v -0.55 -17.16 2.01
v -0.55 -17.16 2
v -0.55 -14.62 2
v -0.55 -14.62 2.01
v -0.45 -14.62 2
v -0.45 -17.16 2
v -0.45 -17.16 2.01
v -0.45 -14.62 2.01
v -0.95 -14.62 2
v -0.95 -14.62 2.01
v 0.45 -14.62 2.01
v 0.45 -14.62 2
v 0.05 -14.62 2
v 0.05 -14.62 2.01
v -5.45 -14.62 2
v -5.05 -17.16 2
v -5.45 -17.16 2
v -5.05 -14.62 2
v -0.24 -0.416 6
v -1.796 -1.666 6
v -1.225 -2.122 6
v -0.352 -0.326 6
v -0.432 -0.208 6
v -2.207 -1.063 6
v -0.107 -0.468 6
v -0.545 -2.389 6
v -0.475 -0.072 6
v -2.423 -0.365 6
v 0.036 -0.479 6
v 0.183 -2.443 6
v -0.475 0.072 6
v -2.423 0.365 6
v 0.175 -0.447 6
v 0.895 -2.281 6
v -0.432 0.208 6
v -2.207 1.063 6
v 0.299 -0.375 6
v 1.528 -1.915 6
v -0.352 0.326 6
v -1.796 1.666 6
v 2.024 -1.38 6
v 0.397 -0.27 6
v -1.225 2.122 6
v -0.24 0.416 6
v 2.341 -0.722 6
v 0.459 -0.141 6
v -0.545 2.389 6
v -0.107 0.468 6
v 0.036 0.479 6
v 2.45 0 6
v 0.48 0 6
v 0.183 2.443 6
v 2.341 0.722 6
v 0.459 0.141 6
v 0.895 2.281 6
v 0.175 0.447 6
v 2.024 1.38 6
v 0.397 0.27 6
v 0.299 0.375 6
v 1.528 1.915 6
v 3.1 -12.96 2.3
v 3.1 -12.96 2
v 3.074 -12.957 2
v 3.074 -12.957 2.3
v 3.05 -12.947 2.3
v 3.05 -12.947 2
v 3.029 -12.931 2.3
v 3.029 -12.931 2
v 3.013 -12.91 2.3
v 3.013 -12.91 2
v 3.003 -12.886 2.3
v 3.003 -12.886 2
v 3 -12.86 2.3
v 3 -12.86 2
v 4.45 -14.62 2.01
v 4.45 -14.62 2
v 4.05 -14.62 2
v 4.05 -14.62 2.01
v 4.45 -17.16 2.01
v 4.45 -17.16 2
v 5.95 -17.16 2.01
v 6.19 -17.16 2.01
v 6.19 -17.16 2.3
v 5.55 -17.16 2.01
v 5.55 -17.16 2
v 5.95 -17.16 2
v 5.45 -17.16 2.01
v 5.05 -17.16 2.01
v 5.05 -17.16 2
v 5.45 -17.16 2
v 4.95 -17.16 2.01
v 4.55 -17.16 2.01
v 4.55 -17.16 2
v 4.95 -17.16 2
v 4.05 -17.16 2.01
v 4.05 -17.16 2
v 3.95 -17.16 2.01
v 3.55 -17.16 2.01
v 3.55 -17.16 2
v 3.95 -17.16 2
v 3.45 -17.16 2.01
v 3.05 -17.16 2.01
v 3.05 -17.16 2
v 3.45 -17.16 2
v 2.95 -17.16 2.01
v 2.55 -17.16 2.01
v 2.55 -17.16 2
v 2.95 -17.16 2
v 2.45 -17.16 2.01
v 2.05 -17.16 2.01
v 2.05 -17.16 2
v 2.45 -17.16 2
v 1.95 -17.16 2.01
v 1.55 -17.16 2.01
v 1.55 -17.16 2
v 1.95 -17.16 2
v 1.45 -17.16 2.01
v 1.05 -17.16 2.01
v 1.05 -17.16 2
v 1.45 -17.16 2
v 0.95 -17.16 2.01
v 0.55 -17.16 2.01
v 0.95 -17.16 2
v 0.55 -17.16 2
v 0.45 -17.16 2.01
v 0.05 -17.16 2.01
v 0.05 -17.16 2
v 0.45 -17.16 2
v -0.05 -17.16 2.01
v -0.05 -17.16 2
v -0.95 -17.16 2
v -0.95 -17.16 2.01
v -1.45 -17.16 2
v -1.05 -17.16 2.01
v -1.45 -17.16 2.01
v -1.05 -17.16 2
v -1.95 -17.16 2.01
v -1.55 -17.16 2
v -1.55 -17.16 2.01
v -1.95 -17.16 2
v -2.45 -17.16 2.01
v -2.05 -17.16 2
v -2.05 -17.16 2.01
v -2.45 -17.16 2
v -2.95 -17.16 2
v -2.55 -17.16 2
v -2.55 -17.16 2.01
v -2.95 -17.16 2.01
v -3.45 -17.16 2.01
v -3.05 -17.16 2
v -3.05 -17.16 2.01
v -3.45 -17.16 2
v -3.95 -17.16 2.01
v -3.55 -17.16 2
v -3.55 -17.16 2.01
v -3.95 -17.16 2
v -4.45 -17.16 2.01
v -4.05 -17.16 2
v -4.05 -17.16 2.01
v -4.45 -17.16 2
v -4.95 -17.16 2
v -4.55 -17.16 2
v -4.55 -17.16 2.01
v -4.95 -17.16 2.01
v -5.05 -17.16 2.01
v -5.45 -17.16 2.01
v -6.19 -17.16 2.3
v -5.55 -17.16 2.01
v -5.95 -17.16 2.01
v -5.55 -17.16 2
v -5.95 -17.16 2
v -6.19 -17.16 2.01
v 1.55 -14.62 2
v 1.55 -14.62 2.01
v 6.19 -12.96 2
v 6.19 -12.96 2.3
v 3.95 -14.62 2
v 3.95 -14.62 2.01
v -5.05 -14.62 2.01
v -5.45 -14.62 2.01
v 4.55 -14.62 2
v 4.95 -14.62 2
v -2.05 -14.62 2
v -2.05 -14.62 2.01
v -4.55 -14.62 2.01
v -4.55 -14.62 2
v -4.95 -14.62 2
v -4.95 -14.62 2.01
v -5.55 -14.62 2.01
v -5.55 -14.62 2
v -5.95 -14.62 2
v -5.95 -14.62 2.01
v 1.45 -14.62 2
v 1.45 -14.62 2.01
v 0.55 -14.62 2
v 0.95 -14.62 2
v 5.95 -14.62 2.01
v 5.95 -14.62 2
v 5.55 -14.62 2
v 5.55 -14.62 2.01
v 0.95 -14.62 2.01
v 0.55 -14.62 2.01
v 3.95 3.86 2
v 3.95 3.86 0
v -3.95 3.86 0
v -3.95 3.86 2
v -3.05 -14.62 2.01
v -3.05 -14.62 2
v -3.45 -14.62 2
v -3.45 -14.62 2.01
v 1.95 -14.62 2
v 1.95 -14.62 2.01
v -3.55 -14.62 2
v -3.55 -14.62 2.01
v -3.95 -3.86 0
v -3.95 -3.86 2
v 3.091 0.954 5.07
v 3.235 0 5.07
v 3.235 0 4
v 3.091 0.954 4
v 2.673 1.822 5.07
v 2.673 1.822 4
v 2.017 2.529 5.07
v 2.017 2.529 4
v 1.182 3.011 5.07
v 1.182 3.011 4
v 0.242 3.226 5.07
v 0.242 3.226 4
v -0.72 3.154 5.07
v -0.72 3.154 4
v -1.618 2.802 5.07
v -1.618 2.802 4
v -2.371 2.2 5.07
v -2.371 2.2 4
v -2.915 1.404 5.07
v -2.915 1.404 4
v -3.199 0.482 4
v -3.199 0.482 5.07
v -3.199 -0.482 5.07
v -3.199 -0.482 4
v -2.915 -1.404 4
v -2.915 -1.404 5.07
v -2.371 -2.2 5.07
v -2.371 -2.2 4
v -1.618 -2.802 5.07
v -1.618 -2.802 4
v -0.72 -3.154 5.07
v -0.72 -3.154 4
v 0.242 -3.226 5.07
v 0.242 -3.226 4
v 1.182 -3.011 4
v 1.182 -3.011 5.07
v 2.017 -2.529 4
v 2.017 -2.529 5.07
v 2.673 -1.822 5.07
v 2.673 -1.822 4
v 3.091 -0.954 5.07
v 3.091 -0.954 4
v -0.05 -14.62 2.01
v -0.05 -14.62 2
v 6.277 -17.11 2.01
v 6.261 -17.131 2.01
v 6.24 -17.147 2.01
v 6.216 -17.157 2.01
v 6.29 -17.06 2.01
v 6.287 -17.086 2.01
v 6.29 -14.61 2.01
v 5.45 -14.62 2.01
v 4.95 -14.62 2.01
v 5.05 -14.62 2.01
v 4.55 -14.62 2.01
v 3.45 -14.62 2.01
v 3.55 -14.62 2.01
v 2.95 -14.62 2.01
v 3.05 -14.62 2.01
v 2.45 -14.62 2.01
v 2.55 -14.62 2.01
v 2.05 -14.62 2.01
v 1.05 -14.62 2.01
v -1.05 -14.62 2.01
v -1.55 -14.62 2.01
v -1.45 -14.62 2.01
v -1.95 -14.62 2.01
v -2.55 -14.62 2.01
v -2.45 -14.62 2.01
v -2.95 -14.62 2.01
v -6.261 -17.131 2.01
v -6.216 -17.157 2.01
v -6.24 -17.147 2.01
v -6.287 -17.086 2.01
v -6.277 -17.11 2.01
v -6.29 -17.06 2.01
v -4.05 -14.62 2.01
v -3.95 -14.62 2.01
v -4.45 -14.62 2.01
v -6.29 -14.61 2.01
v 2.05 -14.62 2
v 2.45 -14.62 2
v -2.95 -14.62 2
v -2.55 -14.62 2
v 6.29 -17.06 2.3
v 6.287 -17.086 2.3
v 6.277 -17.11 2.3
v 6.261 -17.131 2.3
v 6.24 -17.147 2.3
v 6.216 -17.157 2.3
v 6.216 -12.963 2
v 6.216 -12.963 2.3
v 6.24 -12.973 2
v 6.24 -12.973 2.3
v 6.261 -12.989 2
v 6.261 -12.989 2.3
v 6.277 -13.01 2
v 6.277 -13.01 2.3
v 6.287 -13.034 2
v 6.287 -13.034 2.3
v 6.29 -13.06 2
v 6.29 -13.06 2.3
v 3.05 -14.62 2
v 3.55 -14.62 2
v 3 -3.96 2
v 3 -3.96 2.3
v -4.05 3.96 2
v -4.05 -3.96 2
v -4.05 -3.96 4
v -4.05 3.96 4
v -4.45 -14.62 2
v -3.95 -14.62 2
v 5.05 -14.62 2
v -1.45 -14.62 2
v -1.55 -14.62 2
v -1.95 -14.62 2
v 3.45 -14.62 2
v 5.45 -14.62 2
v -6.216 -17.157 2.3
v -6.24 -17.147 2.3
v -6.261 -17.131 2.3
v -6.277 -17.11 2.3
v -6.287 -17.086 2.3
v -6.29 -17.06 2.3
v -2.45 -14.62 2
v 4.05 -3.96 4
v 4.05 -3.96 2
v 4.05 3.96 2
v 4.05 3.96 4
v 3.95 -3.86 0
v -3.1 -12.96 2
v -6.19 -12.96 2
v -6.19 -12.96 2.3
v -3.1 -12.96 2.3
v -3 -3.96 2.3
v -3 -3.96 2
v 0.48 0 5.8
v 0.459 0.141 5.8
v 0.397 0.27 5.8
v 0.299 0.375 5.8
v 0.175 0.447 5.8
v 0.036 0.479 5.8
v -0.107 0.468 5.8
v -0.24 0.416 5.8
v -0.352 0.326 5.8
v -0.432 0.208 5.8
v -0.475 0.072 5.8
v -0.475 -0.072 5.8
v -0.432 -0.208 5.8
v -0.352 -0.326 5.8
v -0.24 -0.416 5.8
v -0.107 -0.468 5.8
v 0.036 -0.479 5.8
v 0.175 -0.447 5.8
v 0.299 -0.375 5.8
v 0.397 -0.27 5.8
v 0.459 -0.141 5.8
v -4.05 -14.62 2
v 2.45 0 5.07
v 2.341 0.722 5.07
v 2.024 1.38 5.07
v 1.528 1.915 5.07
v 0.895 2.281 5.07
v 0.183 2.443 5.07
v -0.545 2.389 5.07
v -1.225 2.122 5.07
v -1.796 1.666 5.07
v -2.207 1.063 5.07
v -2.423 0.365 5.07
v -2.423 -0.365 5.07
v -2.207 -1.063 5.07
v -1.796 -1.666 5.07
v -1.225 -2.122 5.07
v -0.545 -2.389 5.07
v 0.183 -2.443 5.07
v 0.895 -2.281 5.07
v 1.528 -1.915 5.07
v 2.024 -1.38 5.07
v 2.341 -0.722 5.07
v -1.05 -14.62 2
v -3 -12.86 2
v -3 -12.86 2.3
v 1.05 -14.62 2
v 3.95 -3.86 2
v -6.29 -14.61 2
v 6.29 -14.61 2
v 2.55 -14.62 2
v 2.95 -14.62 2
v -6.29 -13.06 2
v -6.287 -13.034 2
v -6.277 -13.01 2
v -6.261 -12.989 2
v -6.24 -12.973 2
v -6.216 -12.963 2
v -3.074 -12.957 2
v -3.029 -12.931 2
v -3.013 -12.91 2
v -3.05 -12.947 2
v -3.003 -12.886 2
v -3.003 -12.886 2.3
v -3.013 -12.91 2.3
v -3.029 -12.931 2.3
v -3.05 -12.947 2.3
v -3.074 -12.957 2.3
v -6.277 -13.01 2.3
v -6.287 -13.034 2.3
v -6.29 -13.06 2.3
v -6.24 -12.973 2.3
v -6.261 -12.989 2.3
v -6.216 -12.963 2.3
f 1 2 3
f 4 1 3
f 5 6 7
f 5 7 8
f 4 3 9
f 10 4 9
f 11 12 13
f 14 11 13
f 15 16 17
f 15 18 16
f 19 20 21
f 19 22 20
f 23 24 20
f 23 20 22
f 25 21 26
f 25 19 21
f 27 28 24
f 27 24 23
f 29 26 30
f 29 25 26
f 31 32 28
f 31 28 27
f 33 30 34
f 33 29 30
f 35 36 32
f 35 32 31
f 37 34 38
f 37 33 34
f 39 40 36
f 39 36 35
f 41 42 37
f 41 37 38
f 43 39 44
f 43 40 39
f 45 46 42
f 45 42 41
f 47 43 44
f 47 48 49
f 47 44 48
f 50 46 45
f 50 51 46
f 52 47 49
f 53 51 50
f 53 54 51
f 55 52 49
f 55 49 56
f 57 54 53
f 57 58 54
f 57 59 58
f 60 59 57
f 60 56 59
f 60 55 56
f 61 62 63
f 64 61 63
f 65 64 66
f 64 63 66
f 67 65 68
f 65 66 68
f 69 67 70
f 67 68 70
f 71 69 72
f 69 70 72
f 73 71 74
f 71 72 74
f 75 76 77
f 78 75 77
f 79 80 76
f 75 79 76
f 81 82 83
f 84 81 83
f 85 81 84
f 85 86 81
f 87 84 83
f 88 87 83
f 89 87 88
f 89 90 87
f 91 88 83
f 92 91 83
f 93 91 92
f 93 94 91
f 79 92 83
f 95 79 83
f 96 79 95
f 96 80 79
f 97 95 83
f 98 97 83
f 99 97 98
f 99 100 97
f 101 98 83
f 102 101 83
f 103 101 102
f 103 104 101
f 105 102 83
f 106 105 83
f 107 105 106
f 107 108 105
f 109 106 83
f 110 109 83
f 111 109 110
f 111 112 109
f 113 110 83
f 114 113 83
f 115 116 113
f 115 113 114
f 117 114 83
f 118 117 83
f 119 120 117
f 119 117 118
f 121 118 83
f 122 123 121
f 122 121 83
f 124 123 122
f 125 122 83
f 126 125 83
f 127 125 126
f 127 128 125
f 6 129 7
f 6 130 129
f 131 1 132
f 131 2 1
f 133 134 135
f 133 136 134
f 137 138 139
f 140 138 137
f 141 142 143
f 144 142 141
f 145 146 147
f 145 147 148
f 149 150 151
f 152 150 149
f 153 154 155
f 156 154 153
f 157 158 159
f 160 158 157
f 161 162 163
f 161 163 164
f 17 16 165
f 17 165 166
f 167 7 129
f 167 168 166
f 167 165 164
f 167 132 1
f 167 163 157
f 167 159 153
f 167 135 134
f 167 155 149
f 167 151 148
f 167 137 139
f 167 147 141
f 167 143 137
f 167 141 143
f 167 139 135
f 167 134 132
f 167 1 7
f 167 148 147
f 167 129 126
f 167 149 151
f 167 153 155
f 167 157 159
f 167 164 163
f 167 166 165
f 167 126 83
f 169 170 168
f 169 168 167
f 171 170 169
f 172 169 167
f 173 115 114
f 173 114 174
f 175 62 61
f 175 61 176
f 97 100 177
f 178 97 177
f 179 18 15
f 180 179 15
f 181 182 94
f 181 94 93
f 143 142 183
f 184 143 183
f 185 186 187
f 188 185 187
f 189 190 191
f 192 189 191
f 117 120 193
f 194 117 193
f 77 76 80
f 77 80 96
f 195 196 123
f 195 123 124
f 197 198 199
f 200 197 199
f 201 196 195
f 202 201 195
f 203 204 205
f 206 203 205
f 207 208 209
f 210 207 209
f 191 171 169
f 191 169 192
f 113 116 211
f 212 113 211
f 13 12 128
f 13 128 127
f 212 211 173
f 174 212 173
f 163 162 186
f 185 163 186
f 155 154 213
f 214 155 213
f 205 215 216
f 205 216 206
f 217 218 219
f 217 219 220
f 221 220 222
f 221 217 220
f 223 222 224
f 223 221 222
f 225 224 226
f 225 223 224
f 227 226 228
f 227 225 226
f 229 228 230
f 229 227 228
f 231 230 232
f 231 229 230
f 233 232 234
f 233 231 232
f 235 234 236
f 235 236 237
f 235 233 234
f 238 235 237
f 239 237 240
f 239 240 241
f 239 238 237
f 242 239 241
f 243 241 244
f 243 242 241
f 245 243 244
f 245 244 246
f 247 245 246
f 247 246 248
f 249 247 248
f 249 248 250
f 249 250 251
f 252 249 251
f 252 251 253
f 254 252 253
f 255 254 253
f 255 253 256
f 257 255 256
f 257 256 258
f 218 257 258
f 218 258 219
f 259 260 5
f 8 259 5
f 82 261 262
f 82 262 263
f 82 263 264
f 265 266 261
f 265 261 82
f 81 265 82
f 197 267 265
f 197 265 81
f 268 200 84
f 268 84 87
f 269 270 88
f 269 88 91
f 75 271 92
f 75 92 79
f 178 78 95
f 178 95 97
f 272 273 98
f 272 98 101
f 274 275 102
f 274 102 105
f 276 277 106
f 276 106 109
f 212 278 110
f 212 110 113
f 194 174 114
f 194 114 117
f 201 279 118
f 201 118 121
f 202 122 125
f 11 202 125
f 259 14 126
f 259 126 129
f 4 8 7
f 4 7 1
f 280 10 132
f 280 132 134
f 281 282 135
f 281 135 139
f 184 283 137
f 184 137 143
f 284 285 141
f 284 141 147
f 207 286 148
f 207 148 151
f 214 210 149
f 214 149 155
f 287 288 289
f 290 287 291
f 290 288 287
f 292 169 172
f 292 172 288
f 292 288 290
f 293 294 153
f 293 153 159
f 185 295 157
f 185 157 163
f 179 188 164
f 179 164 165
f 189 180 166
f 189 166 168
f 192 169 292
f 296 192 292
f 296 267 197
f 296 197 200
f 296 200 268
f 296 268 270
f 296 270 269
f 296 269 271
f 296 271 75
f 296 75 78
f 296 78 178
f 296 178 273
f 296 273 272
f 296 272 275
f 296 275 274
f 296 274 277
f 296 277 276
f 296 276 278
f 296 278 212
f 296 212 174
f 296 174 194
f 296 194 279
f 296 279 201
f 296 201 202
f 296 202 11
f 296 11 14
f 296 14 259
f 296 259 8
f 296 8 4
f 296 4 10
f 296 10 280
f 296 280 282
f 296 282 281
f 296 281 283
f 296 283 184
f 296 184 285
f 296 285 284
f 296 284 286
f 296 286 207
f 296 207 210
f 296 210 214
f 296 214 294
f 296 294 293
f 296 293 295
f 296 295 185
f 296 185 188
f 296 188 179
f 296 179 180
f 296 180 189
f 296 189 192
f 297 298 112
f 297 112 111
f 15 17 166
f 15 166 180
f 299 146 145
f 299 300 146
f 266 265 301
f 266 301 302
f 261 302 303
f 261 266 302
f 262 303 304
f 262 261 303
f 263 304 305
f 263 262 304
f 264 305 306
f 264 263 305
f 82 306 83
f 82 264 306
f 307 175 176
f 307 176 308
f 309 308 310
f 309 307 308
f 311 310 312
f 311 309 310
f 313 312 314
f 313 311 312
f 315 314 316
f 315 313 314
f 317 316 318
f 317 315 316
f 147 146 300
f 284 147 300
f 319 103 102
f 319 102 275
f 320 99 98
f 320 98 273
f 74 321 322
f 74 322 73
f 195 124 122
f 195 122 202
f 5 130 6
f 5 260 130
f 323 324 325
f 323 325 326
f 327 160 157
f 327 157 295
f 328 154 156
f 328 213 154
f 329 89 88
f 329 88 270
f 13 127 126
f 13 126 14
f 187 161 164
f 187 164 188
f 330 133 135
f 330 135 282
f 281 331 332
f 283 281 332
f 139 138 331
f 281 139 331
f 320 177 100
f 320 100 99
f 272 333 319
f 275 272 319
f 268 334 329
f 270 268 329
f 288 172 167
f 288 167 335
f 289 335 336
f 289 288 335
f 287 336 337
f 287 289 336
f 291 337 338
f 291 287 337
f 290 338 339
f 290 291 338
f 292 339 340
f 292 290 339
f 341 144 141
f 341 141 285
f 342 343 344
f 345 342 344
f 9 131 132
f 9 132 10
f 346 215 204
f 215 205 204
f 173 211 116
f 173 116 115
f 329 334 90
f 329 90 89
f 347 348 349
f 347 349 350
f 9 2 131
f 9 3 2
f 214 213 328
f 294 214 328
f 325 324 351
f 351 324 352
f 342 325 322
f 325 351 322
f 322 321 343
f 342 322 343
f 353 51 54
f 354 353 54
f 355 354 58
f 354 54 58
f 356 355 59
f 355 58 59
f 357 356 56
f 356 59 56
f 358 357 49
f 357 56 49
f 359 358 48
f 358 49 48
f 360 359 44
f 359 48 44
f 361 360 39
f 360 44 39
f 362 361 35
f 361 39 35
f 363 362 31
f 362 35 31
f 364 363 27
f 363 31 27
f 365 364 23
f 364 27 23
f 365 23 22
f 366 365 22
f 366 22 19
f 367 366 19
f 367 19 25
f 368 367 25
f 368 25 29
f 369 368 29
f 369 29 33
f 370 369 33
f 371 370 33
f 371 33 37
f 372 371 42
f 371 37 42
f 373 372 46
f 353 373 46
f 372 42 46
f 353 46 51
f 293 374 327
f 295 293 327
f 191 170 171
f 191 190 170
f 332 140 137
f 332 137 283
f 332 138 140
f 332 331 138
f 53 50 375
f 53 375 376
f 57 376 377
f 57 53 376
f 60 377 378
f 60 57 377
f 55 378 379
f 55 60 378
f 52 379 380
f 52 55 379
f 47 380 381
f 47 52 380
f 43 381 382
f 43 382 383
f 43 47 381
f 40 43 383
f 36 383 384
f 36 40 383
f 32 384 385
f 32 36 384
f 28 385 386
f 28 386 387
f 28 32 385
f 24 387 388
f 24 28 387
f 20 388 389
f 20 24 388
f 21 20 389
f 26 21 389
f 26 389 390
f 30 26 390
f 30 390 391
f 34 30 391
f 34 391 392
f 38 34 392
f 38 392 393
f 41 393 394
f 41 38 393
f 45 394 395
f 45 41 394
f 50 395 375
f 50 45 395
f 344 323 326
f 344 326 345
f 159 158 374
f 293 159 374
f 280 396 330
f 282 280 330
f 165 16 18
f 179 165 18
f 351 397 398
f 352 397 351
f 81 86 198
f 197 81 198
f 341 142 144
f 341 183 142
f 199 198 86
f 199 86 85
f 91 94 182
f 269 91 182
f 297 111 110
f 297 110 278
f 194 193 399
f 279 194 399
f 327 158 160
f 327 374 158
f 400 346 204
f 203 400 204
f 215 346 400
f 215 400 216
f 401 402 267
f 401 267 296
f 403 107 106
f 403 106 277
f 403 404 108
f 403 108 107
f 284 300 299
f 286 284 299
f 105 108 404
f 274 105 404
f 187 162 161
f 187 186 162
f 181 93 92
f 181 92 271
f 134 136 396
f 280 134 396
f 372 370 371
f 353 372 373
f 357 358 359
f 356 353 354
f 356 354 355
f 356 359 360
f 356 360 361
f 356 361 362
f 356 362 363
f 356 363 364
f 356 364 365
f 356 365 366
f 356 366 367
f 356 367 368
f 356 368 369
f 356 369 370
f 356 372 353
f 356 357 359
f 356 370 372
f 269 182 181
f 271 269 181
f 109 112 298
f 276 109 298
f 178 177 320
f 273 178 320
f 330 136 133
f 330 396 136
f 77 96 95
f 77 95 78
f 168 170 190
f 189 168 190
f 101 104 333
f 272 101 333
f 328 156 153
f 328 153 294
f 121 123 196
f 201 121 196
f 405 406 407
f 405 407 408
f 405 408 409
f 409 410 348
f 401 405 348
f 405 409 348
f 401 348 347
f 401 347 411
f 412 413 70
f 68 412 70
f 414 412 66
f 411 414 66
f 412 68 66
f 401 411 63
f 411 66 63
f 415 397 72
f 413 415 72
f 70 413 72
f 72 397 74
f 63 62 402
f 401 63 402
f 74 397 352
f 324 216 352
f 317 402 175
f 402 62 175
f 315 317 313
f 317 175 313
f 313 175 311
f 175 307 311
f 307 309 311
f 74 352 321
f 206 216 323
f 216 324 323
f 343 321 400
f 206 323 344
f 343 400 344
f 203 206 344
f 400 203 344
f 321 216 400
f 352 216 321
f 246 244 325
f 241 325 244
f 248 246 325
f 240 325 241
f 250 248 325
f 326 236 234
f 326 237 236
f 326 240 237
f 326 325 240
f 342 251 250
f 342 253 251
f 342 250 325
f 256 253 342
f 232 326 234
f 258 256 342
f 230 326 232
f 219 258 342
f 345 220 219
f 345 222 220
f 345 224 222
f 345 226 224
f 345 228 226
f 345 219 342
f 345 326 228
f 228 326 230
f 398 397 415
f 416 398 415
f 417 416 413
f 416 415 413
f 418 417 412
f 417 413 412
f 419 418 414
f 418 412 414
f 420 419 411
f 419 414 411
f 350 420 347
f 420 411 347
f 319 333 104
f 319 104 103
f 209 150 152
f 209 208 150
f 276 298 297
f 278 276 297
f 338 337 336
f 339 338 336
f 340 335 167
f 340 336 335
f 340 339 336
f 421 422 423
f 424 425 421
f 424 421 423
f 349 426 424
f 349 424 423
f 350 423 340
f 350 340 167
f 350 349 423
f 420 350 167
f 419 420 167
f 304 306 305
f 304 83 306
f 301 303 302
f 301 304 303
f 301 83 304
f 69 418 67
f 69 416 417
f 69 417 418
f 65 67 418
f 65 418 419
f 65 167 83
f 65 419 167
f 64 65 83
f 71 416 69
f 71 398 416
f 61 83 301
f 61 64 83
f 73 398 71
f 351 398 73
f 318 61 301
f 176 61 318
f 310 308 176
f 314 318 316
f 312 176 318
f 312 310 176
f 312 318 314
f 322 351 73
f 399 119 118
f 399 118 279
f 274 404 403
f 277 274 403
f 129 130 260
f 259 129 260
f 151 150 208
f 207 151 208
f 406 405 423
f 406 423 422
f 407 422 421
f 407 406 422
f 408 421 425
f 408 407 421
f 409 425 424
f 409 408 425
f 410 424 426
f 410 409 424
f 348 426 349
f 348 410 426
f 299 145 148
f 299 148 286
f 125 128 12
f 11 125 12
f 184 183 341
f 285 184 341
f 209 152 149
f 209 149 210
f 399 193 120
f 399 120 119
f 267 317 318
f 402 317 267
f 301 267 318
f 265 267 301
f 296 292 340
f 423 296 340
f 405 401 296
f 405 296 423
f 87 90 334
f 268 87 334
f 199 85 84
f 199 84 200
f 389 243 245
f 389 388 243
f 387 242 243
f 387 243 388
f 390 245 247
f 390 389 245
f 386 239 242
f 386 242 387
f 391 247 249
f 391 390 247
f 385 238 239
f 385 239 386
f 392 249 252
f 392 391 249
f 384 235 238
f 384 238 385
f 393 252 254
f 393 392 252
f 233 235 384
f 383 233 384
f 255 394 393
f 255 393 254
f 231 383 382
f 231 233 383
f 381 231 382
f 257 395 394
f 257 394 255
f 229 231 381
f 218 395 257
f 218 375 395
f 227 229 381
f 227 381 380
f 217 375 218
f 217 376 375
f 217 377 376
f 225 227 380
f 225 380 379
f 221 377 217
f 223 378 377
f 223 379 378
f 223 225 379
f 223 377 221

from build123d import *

# Parameters (mm, degrees)
SKETCH1_W           = 8.1
SKETCH1_H           = 7.92
BOSS_EXTRUDE1_DEPTH = 6
SKETCH2_W           = 8.1
SKETCH2_H           = 7.92
SKETCH2_R           = 3.235
CUT_EXTRUDE1_DEPTH  = 2
SKETCH3_R           = 3.235
SKETCH3_R_2         = 2.45
CUT_EXTRUDE2_DEPTH  = 0.93
SKETCH4_R           = 0.48
CUT_EXTRUDE3_DEPTH  = 0.2
SKETCH5_W           = 8.1
SKETCH5_H           = 7.92
SKETCH5_W_2         = 7.9
SKETCH5_H_2         = 7.72
CUT_EXTRUDE4_DEPTH  = 2
BOSS_EXTRUDE2_DEPTH = 0.3
CUT_EXTRUDE5_DEPTH  = 0.01
FILLET1_R           = 0.1


with BuildPart() as part:
    # Sketch1 → Boss-Extrude1 (new body)
    with BuildSketch(Plane.XY):
        Rectangle(SKETCH1_W, SKETCH1_H)
    extrude(amount=BOSS_EXTRUDE1_DEPTH)

    # Sketch2 → Cut-Extrude1 (cut)
    with BuildSketch(Plane.XY.offset(6)):
        Rectangle(SKETCH2_W, SKETCH2_H)
        Circle(SKETCH2_R, mode=Mode.SUBTRACT)
    extrude(amount=-CUT_EXTRUDE1_DEPTH, mode=Mode.SUBTRACT)

    # Sketch3 → Cut-Extrude2 (cut)
    with BuildSketch(Plane.XY.offset(6)):
        Circle(SKETCH3_R)
        Circle(SKETCH3_R_2, mode=Mode.SUBTRACT)
    extrude(amount=-CUT_EXTRUDE2_DEPTH, mode=Mode.SUBTRACT)

    # Sketch4 → Cut-Extrude3 (cut)
    with BuildSketch(Plane.XY.offset(6)):
        Circle(SKETCH4_R)
    extrude(amount=-CUT_EXTRUDE3_DEPTH, mode=Mode.SUBTRACT)

    # Sketch5 → Cut-Extrude4 (cut)
    with BuildSketch(Plane(origin=(0, 0, 0), x_dir=(-1, 0, 0), z_dir=(0, 0, -1))):
        Rectangle(SKETCH5_W, SKETCH5_H)
        Rectangle(SKETCH5_W_2, SKETCH5_H_2, mode=Mode.SUBTRACT)
    extrude(amount=-CUT_EXTRUDE4_DEPTH, mode=Mode.SUBTRACT)

    # Sketch6 → Boss-Extrude2 (add)
    with BuildSketch(Plane(origin=(0, 0, 2), x_dir=(-1, 0, 0), z_dir=(0, 0, -1))):
        Polygon((-3, -17.16), (3, -17.16), (6.29, -17.16), (6.29, -12.96), (3, -12.96), (3, -3.96), (-3, -3.96), (-3, -12.96), (-6.29, -12.96), (-6.29, -17.16), align=None)
    extrude(amount=-BOSS_EXTRUDE2_DEPTH)

    # Sketch7 → Cut-Extrude5 (cut)
    with BuildSketch(Plane(origin=(0, 0, 2), x_dir=(-1, 0, 0), z_dir=(0, 0, -1))):
        Polygon((6.29, -14.61), (-6.29, -14.61), (-6.29, -17.16), (-5.95, -17.16), (-5.95, -14.62), (-5.55, -14.62), (-5.55, -17.16), (-5.45, -17.16), (-5.45, -14.62), (-5.05, -14.62), (-5.05, -17.16), (-4.95, -17.16), (-4.95, -14.62), (-4.55, -14.62), (-4.55, -17.16), (-4.45, -17.16), (-4.45, -14.62), (-4.05, -14.62), (-4.05, -17.16), (-3.95, -17.16), (-3.95, -14.62), (-3.55, -14.62), (-3.55, -17.16), (-3.45, -17.16), (-3.45, -14.62), (-3.05, -14.62), (-3.05, -17.16), (-2.95, -17.16), (-2.95, -14.62), (-2.55, -14.62), (-2.55, -17.16), (-2.45, -17.16), (-2.45, -14.62), (-2.05, -14.62), (-2.05, -17.16), (-1.95, -17.16), (-1.95, -14.62), (-1.55, -14.62), (-1.55, -17.16), (-1.45, -17.16), (-1.45, -14.62), (-1.05, -14.62), (-1.05, -17.16), (-0.95, -17.16), (-0.95, -14.62), (-0.55, -14.62), (-0.55, -17.16), (-0.45, -17.16), (-0.45, -14.62), (-0.05, -14.62), (-0.05, -17.16), (0.05, -17.16), (0.05, -14.62), (0.45, -14.62), (0.45, -17.16), (0.55, -17.16), (0.55, -14.62), (0.95, -14.62), (0.95, -17.16), (1.05, -17.16), (1.05, -14.62), (1.45, -14.62), (1.45, -17.16), (1.55, -17.16), (1.55, -14.62), (1.95, -14.62), (1.95, -17.16), (2.05, -17.16), (2.05, -14.62), (2.45, -14.62), (2.45, -17.16), (2.55, -17.16), (2.55, -14.62), (2.95, -14.62), (2.95, -17.16), (3.05, -17.16), (3.05, -14.62), (3.45, -14.62), (3.45, -17.16), (3.55, -17.16), (3.55, -14.62), (3.95, -14.62), (3.95, -17.16), (4.05, -17.16), (4.05, -14.62), (4.45, -14.62), (4.45, -17.16), (4.55, -17.16), (4.55, -14.62), (4.95, -14.62), (4.95, -17.16), (5.05, -17.16), (5.05, -14.62), (5.45, -14.62), (5.45, -17.16), (5.55, -17.16), (5.55, -14.62), (5.95, -14.62), (5.95, -17.16), (6.29, -17.16), align=None)
    extrude(amount=-CUT_EXTRUDE5_DEPTH, mode=Mode.SUBTRACT)

    # Fillet1
    fillet1_edges = [part.edges().sort_by_distance(p)[0] for p in [
        (-6.29, -17.16, 2.155),
        (6.29, -17.16, 2.155),
        (3, -12.96, 2.15),
        (-3, -12.96, 2.15),
        (-6.29, -12.96, 2.15),
        (6.29, -12.96, 2.15),
    ]]
    fillet(fillet1_edges, radius=FILLET1_R)


solid = part.part
